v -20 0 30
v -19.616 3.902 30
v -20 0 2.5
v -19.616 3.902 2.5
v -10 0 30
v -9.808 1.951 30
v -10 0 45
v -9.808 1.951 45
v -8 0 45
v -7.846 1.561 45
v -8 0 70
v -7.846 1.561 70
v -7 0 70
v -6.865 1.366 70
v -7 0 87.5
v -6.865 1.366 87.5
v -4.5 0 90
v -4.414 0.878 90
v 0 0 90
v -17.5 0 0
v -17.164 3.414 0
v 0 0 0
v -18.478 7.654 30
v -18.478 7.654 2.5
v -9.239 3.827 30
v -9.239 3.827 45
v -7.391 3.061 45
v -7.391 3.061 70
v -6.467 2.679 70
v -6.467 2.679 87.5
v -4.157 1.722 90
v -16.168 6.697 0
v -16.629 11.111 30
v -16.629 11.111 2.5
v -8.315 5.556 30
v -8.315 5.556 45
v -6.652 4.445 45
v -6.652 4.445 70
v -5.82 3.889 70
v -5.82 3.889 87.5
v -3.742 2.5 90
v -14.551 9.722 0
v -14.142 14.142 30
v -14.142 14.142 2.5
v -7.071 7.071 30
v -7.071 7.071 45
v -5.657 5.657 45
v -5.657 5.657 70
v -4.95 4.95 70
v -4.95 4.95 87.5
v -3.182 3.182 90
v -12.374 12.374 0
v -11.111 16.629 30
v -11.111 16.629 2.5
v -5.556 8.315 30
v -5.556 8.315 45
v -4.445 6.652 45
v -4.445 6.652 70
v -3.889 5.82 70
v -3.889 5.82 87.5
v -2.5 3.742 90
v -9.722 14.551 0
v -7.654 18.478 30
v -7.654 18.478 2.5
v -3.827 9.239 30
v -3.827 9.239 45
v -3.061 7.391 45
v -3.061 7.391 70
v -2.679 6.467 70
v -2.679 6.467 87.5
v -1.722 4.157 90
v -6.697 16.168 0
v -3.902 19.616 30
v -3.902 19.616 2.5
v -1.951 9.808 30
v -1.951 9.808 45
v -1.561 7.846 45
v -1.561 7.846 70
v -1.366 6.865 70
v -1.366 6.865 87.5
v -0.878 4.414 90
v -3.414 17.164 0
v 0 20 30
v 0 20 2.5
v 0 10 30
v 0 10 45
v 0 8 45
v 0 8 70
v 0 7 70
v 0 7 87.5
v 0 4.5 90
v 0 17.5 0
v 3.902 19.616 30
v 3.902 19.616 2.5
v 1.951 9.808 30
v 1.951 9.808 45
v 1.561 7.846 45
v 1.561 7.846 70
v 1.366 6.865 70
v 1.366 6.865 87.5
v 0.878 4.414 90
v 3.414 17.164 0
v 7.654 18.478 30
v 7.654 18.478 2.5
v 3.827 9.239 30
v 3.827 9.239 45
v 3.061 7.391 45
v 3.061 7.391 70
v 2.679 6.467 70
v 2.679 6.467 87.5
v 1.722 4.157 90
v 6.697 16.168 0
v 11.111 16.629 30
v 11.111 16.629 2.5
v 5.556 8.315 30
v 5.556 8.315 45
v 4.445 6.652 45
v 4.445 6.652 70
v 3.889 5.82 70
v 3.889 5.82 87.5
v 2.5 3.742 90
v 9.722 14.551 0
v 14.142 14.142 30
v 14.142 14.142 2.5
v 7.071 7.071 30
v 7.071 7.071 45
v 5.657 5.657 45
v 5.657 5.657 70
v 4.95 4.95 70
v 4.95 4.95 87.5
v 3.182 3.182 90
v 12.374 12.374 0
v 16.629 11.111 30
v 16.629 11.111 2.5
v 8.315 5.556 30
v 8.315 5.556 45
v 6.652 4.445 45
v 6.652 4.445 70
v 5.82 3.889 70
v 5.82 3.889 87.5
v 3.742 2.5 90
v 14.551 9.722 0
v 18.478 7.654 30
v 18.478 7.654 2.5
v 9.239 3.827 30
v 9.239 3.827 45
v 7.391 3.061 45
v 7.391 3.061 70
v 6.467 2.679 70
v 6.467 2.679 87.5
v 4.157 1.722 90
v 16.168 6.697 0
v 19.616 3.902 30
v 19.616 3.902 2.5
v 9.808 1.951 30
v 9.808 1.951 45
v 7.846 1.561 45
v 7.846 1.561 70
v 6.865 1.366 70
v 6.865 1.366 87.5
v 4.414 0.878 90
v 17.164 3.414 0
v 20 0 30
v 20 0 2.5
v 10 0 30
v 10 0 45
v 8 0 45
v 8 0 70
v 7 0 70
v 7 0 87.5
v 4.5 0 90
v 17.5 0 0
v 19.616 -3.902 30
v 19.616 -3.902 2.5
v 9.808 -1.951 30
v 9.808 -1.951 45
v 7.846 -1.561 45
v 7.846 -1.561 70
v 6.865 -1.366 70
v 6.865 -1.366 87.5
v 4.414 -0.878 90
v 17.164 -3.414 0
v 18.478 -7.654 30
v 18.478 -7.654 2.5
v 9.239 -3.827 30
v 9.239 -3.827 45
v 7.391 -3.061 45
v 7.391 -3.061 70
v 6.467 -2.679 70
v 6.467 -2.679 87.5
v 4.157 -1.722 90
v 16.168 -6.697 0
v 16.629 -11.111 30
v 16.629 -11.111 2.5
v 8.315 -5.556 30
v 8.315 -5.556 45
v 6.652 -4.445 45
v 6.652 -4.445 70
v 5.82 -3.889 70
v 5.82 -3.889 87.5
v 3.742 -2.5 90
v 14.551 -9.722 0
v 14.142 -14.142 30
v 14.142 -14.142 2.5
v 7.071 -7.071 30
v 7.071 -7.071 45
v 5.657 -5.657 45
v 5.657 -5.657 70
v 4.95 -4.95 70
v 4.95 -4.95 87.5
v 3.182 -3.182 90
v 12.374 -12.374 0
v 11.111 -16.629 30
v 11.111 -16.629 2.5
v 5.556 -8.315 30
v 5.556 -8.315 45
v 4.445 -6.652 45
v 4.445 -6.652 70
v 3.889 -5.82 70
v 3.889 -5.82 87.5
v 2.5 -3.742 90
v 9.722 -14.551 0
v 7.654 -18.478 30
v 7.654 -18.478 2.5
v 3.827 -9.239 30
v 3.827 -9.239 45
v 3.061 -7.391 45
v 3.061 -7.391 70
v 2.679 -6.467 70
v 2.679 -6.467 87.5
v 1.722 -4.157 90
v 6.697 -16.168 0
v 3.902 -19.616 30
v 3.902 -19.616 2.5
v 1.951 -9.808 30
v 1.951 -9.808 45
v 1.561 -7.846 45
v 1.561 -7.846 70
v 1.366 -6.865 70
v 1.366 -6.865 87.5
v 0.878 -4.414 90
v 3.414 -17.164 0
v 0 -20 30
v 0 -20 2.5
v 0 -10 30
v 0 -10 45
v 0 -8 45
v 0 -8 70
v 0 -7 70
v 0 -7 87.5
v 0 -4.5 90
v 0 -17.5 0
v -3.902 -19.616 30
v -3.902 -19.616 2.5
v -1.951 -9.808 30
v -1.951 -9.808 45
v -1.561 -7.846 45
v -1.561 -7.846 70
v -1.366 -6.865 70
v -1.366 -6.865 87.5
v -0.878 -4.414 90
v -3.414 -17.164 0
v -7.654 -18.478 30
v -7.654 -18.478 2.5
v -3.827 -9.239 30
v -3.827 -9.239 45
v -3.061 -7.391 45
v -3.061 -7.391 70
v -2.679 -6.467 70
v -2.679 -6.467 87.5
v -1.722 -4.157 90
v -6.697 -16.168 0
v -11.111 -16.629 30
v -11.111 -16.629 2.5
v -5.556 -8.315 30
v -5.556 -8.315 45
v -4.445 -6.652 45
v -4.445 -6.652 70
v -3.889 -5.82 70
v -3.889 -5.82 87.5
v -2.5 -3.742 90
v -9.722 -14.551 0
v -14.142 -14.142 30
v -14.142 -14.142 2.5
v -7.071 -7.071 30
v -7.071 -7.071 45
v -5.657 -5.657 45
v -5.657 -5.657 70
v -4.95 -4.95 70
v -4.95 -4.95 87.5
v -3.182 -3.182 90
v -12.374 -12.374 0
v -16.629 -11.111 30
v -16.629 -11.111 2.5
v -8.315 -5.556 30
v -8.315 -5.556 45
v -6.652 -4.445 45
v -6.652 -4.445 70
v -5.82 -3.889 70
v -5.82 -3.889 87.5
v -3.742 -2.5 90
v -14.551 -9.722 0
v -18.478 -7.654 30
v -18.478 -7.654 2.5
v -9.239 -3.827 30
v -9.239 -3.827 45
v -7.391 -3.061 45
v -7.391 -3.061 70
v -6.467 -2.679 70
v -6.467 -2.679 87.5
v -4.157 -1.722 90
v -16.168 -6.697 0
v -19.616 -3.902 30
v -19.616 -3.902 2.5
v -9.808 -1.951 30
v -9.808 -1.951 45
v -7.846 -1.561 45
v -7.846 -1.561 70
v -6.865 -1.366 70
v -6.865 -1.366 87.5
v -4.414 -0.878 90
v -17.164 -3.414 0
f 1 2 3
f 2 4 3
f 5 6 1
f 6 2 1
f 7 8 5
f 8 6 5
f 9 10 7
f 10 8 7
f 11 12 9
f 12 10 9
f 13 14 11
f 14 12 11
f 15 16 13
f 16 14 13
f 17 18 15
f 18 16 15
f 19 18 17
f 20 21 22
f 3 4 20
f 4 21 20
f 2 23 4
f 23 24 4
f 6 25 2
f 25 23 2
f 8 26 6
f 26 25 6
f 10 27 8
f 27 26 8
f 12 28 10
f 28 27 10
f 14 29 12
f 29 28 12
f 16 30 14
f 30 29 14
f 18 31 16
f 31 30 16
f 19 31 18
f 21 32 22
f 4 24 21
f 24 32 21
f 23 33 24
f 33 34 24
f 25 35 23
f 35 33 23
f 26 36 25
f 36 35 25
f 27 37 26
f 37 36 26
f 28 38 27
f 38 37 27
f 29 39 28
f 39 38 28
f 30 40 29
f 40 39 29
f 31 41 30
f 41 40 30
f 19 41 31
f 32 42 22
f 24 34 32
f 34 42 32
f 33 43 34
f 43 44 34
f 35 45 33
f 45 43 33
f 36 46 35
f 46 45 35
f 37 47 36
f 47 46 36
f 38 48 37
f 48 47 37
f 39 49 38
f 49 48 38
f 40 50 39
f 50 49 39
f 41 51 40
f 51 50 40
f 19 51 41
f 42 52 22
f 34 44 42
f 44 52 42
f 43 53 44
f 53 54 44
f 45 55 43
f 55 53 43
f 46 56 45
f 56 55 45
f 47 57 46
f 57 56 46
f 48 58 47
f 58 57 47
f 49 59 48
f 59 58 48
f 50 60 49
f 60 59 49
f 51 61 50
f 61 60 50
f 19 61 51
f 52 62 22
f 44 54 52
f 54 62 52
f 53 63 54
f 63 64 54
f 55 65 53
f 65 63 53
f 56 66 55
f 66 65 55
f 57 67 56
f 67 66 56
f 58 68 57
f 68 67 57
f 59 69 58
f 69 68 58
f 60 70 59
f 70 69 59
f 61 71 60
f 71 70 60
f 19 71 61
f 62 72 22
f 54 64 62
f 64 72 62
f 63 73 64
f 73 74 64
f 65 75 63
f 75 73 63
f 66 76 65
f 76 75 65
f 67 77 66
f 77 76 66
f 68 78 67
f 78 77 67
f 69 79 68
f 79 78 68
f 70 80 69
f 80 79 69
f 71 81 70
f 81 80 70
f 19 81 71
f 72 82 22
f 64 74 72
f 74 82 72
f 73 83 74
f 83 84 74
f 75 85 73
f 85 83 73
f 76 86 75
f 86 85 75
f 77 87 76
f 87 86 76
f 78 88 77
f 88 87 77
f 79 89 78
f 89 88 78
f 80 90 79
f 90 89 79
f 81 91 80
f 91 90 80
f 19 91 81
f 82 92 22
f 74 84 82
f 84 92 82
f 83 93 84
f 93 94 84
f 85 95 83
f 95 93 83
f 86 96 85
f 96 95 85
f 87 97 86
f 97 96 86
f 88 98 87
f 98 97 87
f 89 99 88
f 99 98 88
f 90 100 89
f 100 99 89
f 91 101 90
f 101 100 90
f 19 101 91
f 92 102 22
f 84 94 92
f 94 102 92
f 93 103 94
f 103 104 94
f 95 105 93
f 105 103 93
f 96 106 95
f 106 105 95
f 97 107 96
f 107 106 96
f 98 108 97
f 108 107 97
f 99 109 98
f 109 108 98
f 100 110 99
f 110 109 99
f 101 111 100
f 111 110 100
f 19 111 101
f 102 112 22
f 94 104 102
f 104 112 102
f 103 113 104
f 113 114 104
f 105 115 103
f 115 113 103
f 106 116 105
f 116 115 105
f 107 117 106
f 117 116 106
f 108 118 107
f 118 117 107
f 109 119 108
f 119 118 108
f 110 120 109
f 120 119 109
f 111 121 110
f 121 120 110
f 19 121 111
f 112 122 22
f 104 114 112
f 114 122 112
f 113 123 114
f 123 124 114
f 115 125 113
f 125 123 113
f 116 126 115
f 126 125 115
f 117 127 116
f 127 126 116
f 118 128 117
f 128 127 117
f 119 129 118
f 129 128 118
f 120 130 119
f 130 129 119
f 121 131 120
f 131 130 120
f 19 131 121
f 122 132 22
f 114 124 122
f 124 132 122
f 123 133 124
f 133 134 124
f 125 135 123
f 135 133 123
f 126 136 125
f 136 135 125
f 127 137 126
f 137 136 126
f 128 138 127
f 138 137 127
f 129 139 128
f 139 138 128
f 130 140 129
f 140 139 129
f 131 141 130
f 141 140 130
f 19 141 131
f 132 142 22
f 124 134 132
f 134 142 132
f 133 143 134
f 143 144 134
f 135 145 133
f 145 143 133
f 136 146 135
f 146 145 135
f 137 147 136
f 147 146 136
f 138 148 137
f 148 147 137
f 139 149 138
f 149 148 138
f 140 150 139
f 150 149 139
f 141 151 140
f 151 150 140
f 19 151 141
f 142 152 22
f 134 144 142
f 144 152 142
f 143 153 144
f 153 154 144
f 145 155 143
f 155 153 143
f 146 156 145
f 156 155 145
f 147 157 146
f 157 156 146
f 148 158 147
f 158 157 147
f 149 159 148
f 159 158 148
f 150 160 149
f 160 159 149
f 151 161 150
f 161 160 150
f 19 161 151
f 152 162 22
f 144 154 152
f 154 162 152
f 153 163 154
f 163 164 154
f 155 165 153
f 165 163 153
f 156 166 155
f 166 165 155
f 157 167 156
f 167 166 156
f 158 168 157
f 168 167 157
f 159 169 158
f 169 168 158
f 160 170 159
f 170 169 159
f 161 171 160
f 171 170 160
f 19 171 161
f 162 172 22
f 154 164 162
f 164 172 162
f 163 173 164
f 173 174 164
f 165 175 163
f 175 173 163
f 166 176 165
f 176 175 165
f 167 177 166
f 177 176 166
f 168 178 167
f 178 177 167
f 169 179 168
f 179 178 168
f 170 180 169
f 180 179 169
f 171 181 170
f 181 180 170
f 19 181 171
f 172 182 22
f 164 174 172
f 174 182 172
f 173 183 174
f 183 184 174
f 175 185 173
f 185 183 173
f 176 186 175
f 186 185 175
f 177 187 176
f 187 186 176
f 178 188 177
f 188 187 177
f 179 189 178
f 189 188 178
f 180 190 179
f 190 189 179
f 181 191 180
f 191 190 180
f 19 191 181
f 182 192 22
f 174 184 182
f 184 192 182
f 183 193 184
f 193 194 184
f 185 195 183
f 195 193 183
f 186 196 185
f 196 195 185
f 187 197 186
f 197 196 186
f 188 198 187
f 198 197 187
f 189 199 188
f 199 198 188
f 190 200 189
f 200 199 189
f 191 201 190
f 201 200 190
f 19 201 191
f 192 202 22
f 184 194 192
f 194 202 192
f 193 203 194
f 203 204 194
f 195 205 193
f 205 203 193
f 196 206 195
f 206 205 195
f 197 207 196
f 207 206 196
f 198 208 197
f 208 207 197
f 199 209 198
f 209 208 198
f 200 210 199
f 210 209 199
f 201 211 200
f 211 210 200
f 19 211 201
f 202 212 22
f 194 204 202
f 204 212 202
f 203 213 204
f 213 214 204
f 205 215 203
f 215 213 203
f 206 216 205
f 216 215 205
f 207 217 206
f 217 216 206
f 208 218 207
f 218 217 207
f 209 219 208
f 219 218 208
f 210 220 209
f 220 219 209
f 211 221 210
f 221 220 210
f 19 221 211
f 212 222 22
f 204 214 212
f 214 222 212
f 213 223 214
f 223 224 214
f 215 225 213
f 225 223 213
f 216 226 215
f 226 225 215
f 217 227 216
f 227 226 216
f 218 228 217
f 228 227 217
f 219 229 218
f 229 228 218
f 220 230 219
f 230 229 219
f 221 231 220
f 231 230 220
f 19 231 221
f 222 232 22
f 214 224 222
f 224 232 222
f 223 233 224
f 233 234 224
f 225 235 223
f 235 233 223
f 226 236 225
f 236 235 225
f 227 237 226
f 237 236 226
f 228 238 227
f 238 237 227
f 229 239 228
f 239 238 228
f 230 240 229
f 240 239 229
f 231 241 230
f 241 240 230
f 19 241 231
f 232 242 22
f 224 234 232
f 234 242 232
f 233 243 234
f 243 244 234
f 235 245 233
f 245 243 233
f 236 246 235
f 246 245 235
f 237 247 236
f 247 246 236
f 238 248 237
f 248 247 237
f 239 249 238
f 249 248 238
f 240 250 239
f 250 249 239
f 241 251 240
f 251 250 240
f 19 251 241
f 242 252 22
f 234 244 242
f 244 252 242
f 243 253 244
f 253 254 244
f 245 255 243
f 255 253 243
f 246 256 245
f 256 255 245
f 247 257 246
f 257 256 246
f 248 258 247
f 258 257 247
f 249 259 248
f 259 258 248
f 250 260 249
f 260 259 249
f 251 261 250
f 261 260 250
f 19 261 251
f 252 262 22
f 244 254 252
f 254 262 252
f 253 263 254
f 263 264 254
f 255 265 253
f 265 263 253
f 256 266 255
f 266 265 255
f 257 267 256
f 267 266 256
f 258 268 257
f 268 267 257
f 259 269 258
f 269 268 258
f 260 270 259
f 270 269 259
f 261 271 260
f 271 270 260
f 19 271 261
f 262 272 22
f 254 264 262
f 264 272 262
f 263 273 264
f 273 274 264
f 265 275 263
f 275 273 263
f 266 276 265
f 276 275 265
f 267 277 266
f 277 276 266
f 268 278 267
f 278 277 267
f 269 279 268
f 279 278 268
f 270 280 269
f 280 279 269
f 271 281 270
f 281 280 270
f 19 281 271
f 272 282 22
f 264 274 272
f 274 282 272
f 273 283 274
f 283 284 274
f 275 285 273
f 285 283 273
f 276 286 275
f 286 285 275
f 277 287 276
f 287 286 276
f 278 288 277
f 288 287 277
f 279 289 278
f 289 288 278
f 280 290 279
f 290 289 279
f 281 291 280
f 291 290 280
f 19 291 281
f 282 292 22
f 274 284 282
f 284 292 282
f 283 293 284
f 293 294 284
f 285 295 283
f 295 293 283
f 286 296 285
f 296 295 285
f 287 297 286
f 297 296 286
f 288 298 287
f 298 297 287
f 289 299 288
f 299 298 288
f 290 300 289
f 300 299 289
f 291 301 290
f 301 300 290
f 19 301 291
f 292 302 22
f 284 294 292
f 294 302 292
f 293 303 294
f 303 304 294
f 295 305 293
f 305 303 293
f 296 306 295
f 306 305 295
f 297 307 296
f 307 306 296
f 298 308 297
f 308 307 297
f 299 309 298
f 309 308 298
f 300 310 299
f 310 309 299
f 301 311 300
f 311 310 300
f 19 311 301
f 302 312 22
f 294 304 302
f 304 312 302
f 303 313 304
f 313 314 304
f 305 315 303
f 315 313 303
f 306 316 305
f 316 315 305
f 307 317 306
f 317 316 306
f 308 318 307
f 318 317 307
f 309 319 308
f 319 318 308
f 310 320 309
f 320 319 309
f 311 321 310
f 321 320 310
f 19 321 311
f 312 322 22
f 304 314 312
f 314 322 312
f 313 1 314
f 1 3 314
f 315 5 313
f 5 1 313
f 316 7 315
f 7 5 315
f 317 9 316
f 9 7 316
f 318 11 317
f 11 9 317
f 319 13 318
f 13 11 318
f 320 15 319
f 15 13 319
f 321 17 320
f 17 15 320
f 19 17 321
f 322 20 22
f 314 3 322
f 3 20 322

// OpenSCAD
$fn = 32;

// ----------------------------------------------------------------------
// Stepped shaft: diameters 40, 20, 16, 14 mm, 90 mm long
// ----------------------------------------------------------------------

// --- parameters (mm) ---
d1 = 40;                  // step 1 diameter
len1 = 30;                // step 1 length
d2 = 20;                  // step 2 diameter
len2 = 15;                // step 2 length
d3 = 16;                  // step 3 diameter
len3 = 25;                // step 3 length
d4 = 14;                  // step 4 diameter
len4 = 20;                // step 4 length
total = 90;               // overall length
chamfer = 2.5;            // end chamfer

/* closed turning profile: x is the radius, y is the length */
profile = [[0, 0], [20 - chamfer, 0], [20, chamfer], [20, 30], [10, 30], [10, 45], [8, 45], [8, 70], [7, 70], [7, 87.5], [4.5, 90], [0, 90]];

difference() {
  rotate_extrude() polygon(profile);
}
